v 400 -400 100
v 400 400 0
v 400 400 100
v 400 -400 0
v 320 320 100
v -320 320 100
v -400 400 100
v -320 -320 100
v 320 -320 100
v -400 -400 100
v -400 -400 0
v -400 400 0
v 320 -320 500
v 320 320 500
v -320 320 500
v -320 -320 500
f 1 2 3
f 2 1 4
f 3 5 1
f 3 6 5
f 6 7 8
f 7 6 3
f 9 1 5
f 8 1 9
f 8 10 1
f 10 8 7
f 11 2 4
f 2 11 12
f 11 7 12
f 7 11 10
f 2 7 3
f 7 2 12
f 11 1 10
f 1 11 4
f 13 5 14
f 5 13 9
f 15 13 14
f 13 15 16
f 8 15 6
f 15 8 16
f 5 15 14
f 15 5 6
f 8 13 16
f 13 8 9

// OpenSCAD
// Minimal voxel beacon. Millimetres: 1000 mm = one game block.
module Base() {
    translate([-400,-400,0]) cube([800,800,100]);
}
module Glass() {
    translate([-320,-320,100]) cube([640,640,400]);
}
module Core() {
    translate([0,0,100]) intersection() {
        sphere(r=240,$fn=20);
        translate([-240,-240,0]) cube([480,480,240]);
    }
}
Base(); Glass(); Core();
